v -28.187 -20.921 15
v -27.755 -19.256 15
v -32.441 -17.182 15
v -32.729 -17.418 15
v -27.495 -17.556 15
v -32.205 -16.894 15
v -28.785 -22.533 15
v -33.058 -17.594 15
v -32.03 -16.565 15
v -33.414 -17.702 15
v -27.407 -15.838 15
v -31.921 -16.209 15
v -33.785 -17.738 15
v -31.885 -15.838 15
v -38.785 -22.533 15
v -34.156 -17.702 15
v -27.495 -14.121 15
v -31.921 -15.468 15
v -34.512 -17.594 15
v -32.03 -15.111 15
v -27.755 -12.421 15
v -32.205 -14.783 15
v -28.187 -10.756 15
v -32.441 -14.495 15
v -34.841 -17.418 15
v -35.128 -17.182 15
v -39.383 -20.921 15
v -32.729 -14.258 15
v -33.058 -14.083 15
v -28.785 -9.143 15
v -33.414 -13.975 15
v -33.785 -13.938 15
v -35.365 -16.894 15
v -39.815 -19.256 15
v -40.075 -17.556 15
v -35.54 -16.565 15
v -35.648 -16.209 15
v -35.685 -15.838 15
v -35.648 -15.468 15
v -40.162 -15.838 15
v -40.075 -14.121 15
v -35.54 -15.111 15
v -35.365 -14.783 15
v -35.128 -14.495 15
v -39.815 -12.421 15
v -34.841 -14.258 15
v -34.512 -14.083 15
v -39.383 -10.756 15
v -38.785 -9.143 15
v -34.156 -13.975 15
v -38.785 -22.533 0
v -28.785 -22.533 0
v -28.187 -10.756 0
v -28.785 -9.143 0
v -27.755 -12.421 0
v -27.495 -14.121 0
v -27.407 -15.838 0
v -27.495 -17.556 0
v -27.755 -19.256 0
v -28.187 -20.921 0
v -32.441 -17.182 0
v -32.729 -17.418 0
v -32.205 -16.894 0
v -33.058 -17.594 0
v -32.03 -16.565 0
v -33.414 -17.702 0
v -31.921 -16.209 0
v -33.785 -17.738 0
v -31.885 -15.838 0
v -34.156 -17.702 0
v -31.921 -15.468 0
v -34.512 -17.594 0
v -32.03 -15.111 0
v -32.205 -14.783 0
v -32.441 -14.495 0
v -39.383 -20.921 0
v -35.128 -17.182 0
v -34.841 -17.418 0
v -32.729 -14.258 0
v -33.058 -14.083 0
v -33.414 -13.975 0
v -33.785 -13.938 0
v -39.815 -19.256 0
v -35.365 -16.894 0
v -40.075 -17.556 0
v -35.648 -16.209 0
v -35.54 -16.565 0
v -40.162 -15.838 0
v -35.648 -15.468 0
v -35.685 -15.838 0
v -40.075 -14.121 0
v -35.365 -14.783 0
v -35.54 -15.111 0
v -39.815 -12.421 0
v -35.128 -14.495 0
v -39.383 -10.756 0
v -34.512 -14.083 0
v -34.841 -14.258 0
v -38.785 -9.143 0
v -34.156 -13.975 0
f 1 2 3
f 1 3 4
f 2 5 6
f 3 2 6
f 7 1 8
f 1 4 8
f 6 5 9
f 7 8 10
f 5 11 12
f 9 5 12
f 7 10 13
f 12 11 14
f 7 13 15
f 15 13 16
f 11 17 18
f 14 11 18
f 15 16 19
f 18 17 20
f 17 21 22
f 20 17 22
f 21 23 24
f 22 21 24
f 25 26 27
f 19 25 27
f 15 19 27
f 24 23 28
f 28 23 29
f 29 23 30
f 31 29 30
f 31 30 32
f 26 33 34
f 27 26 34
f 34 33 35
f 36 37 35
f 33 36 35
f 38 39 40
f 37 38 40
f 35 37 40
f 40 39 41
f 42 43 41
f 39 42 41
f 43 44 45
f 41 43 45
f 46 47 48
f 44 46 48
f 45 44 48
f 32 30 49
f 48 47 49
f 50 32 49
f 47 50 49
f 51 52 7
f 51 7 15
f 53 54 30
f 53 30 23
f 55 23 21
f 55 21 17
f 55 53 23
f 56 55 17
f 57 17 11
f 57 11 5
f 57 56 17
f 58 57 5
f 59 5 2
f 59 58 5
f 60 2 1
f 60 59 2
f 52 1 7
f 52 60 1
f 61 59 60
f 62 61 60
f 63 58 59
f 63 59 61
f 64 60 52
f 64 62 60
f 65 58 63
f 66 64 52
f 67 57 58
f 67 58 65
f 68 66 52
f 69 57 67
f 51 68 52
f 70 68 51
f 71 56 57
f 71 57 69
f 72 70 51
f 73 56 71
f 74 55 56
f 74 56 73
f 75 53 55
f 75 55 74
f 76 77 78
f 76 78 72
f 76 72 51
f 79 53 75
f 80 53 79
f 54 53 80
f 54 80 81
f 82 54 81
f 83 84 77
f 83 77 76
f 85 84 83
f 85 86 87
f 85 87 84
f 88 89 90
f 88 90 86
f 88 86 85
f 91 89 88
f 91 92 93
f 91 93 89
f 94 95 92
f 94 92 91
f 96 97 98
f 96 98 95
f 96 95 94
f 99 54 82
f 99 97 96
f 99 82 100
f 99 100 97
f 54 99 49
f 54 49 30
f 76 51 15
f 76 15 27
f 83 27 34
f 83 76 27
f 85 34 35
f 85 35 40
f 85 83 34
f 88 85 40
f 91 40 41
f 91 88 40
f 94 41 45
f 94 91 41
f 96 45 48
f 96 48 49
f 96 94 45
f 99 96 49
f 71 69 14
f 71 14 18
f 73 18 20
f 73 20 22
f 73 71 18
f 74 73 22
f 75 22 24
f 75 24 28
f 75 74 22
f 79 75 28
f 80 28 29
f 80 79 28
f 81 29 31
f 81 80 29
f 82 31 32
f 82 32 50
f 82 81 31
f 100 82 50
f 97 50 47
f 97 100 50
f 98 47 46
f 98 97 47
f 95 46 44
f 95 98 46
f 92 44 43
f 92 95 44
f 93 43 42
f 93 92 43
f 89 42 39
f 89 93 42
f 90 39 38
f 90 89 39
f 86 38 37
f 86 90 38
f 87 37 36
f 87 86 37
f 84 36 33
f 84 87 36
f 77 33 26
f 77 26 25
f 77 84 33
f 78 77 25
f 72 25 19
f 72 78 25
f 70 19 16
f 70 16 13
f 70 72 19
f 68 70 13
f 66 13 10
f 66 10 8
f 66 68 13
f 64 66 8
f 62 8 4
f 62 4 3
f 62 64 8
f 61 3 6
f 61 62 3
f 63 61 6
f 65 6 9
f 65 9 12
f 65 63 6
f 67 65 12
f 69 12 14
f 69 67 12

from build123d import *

# Parameters (mm, degrees)
CROQUIS1_R              = 1.9
SALIENTE_EXTRUIR2_DEPTH = 15


with BuildPart() as part:
    # Croquis1 → Saliente-Extruir2 (new body)
    with BuildSketch(Plane.XY):
        with BuildLine():
            ThreePointArc((-28.784956102, -9.143234849), (-27.407440411, -15.838234849), (-28.784956102, -22.533234849))
            Line((-28.784956102, -22.533234849), (-38.784956102, -22.533234849))
            ThreePointArc((-38.784956102, -22.533234849), (-40.162471794, -15.838234849), (-38.784956102, -9.143234849))
            Line((-38.784956102, -9.143234849), (-28.784956102, -9.143234849))
        make_face()
        with Locations((-33.784956102, -15.838234849)):
            Circle(CROQUIS1_R, mode=Mode.SUBTRACT)
    extrude(amount=SALIENTE_EXTRUIR2_DEPTH)


solid = part.part
